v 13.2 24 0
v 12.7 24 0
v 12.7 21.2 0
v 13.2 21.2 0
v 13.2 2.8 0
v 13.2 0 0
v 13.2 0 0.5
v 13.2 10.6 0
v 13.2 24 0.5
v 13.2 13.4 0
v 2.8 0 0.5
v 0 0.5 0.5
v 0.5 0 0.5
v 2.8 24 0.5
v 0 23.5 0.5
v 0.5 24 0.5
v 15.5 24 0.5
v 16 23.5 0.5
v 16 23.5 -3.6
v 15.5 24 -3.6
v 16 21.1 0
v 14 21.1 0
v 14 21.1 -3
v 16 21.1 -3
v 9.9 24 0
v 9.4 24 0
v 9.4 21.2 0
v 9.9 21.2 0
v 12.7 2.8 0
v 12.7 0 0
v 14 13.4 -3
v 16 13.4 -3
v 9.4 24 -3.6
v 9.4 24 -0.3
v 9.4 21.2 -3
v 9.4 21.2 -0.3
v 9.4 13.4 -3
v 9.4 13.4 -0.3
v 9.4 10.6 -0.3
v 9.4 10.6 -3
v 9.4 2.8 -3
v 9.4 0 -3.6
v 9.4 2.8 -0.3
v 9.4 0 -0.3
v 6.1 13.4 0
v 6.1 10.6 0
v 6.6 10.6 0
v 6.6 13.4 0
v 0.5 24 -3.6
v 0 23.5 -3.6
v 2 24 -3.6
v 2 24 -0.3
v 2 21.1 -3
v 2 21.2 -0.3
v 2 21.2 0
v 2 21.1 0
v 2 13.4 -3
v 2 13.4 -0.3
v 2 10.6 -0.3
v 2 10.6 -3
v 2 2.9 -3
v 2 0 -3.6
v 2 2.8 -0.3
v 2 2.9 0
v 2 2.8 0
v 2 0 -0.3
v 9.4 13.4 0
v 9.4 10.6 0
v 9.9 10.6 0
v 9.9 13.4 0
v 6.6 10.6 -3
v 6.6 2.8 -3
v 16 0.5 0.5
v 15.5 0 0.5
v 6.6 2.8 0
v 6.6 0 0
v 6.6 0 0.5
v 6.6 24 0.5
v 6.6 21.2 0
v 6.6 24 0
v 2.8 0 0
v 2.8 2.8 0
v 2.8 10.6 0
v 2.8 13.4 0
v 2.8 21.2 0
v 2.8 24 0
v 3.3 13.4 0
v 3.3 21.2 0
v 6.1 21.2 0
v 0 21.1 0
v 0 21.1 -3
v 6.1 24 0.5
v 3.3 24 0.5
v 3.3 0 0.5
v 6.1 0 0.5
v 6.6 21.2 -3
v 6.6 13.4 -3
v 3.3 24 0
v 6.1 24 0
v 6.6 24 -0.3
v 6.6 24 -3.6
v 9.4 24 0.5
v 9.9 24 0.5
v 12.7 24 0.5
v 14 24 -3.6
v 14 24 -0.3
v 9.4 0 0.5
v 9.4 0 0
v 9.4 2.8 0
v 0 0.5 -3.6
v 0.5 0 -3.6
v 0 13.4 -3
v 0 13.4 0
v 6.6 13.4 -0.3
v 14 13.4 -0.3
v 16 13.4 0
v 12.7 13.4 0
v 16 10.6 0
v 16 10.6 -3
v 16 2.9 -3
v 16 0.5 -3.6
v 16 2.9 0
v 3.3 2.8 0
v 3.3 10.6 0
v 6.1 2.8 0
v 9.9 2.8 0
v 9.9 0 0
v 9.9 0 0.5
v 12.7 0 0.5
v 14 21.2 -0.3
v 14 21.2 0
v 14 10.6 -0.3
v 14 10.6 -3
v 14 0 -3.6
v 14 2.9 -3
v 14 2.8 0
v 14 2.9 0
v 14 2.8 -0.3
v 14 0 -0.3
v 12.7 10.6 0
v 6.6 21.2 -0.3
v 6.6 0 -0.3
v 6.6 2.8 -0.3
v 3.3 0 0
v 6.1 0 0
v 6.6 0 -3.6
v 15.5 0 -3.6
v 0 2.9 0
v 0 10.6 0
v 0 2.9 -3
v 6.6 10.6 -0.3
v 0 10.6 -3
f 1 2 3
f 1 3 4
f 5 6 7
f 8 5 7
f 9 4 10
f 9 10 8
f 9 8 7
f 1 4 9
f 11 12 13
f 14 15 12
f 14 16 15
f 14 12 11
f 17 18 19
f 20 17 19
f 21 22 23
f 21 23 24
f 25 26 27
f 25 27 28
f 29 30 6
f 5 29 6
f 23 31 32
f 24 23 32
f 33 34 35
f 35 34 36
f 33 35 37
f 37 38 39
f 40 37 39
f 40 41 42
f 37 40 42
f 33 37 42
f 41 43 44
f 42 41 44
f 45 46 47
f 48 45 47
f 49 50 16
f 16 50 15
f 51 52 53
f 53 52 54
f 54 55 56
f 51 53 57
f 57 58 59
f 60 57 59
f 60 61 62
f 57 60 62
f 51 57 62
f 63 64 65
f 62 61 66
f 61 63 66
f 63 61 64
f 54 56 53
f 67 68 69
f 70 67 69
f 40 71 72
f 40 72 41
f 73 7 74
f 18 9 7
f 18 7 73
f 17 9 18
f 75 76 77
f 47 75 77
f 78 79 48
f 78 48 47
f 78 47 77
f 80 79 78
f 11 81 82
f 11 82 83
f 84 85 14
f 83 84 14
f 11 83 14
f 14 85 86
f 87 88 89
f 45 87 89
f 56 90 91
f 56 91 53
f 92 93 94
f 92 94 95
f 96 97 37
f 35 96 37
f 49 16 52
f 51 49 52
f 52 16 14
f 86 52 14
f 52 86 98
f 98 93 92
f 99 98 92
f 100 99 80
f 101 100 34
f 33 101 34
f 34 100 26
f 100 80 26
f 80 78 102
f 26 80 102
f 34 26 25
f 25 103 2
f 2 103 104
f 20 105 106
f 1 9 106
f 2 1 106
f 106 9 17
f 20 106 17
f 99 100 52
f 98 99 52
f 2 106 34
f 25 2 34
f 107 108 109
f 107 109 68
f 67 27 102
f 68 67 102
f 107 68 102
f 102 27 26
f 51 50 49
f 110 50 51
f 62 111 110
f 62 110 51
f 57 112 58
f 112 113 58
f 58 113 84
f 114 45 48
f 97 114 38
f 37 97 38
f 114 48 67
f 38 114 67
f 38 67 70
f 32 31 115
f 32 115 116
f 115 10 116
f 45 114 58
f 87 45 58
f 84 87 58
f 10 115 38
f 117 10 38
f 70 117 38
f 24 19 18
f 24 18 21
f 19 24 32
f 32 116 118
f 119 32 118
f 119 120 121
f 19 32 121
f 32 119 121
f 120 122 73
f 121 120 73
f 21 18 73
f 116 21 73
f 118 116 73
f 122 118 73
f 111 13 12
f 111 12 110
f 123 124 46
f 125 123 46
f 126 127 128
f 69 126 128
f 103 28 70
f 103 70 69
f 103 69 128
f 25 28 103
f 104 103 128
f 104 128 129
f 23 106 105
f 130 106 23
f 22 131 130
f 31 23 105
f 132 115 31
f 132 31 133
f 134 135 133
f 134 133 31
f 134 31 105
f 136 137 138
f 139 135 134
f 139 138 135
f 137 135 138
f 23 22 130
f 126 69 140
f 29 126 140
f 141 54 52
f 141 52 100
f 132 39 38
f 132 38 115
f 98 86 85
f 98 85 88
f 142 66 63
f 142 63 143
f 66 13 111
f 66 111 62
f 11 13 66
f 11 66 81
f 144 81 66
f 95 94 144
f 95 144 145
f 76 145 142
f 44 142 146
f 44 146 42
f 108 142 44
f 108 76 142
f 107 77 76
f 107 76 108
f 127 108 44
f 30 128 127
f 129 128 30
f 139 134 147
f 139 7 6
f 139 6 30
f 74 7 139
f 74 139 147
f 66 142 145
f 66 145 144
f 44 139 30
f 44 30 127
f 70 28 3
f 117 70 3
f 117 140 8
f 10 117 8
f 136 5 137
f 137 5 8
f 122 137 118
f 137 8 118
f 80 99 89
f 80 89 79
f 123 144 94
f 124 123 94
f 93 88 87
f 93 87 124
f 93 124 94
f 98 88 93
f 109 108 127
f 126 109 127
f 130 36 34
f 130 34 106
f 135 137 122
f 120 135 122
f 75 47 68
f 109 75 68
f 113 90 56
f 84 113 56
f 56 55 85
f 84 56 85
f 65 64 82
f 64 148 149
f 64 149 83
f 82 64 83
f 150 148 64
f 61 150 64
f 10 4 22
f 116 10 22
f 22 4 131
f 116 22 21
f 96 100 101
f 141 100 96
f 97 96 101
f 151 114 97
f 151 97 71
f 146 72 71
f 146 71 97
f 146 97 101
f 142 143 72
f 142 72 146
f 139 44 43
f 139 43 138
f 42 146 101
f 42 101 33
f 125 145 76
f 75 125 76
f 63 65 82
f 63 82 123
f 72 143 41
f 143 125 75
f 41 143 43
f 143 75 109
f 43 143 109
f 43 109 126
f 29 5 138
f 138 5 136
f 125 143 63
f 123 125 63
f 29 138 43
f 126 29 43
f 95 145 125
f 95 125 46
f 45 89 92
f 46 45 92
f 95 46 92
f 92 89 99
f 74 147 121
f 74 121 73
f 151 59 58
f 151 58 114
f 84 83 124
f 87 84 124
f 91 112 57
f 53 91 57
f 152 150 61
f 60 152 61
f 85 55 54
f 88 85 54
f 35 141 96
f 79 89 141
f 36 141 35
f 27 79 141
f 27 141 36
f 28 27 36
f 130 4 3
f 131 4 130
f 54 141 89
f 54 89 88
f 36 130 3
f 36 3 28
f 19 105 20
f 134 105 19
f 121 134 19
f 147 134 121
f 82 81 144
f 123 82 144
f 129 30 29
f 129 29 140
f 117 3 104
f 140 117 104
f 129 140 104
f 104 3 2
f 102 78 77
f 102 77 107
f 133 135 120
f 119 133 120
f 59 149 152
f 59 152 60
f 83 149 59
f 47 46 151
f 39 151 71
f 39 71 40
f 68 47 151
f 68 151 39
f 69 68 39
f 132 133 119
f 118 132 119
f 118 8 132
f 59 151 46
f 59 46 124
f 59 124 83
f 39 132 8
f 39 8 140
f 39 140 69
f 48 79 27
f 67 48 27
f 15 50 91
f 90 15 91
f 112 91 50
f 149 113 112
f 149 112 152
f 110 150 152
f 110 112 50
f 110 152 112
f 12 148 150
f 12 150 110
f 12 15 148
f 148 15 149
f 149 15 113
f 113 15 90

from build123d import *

# Parameters (mm, degrees)
F0_W      = 2.8
F0_H      = 24
F1_DEPTH  = 0.5
F3_W      = 16
F3_H      = 2.8
F4_DEPTH  = 0.3
F2_W      = 2
F2_H      = 2.9
F5_DEPTH  = 3
F6_W      = 2
F6_H      = 2.8
F7_DEPTH  = 2.7
F9_W      = 2.8
F9_H      = 2.8
F10_DEPTH = 2.7
F11_W     = 2
F11_H     = 24
F11_W_2   = 2.8
F12_DEPTH = 0.6
F14_SIZE  = 0.5


with BuildPart() as f1:
    # F0 (on Top) → F1 (new body)
    with BuildSketch(Plane.XY):
        with Locations((1.4, 12)):
            Rectangle(F0_W, F0_H)
        with Locations((4.7, 12)):
            Rectangle(F0_W, F0_H)
        with Locations((8, 12)):
            Rectangle(F0_W, F0_H)
        with Locations((11.3, 12)):
            Rectangle(F0_W, F0_H)
        with Locations((14.6, 12)):
            Rectangle(F0_W, F0_H)
    extrude(amount=F1_DEPTH)


with BuildPart() as f4:
    # F3 (on face) → F4 (new body)
    with BuildSketch(Plane(origin=(0, 0, 0), x_dir=(1, 0, 0), z_dir=(0, 0, -1))):
        with Locations((8, -1.4)):
            Rectangle(F3_W, F3_H)
        with Locations((8, -22.6)):
            Rectangle(F3_W, F3_H)
        with Locations((8, -12)):
            Rectangle(F3_W, F3_H)
    extrude(amount=F4_DEPTH)

    # F6 (on face) → F7 (join)
    with BuildSketch(Plane(origin=(0, 0, -0.3), x_dir=(1, 0, 0), z_dir=(0, 0, -1))):
        with Locations((1, -12)):
            Rectangle(F6_W, F6_H)
        with Locations((15, -12)):
            Rectangle(F6_W, F6_H)
    extrude(amount=F7_DEPTH)


with BuildPart() as f5:
    # F2 (on face) → F5 (new body)
    with BuildSketch(Plane(origin=(0, 0, 0), x_dir=(1, 0, 0), z_dir=(0, 0, -1))):
        with Locations((1, -1.45)):
            Rectangle(F2_W, F2_H)
        with Locations((1, -22.55)):
            Rectangle(F2_W, F2_H)
        with Locations((15, -1.45)):
            Rectangle(F2_W, F2_H)
        with Locations((15, -22.55)):
            Rectangle(F2_W, F2_H)
    extrude(amount=F5_DEPTH)


with BuildPart() as f10:
    # F9 (on face) → F10 (new body)
    with BuildSketch(Plane(origin=(0, 0, -0.3), x_dir=(1, 0, 0), z_dir=(0, 0, -1))):
        with Locations((8, -1.4)):
            Rectangle(F9_W, F9_H)
        with Locations((8, -22.6)):
            Rectangle(F9_W, F9_H)
        with Locations((8, -12)):
            Rectangle(F9_W, F9_H)
    extrude(amount=F10_DEPTH)


with BuildPart() as f12:
    # F11 (on face) → F12 (new body)
    with BuildSketch(Plane(origin=(0, 0, -3), x_dir=(1, 0, 0), z_dir=(0, 0, -1))):
        with Locations((1, -12)):
            Rectangle(F11_W, F11_H)
        with Locations((8, -12)):
            Rectangle(F11_W_2, F11_H)
        with Locations((15, -12)):
            Rectangle(F11_W, F11_H)
    extrude(amount=F12_DEPTH)


with BuildPart() as f1_1:
    add(f1.part)

    # F13: union F4, F5, F10, F12
    add(f4.part)
    add(f5.part)
    add(f10.part)
    add(f12.part)

    # F14
    f14_edges = [f1_1.edges().sort_by_distance(p)[0] for p in [
        (0, 24, -1.55),
        (16, 24, -1.55),
        (0, 0, -1.55),
        (16, 0, -1.55),
    ]]
    chamfer(f14_edges, length=F14_SIZE)


solid = f1_1.part
